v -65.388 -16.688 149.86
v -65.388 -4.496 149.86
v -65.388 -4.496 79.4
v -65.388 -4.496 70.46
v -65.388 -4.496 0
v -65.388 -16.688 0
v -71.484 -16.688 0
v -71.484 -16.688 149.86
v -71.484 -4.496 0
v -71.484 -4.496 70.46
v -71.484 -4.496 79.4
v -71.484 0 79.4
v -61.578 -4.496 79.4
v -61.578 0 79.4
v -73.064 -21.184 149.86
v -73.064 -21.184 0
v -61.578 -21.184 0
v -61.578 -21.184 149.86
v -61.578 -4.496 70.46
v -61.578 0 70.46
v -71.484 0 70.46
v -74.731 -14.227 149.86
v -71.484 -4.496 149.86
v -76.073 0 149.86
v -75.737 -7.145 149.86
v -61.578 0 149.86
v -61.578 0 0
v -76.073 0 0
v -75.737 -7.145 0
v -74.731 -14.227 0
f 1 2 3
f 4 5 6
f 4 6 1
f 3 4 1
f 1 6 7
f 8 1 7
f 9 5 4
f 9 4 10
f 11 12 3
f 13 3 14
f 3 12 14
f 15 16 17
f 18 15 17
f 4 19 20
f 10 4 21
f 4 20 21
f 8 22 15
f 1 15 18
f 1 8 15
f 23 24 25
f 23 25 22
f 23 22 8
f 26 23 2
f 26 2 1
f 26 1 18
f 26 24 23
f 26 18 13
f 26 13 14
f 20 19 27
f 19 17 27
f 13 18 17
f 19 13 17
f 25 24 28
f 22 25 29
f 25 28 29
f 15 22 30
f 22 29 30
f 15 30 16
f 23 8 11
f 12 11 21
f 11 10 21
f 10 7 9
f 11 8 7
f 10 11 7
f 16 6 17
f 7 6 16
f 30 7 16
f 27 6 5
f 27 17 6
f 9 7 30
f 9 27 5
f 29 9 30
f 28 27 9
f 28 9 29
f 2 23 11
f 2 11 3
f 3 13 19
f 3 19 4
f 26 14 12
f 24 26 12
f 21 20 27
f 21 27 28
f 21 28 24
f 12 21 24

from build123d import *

# Parameters (mm, degrees)
BOSS_EXTRUDE1_DEPTH = 149.86
SKETCH2_W           = 9.906
SKETCH2_H           = 4.4958
BOSS_EXTRUDE2_DEPTH = 70.4596
SKETCH3_W           = 9.906
SKETCH3_H           = 4.4958
BOSS_EXTRUDE3_DEPTH = 70.4596


with BuildPart() as part:
    # Sketch1 → Boss-Extrude1 (new body)
    with BuildSketch(Plane.XY):
        with BuildLine():
            Line((-61.5779714, -4.4958), (-65.3879714, -4.4958))
            Line((-65.3879714, -4.4958), (-65.3879714, -16.6878))
            Line((-65.3879714, -16.6878), (-71.4839714, -16.6878))
            Line((-71.4839714, -16.6878), (-71.4839714, 0))
            Line((-71.4839714, 0), (-76.073, 0))
            ThreePointArc((-76.073, 0), (-75.317007822, -10.698114871), (-73.064056964, -21.1836))
            Line((-73.064056964, -21.1836), (-61.5779714, -21.1836))
            Line((-61.5779714, -21.1836), (-61.5779714, -4.4958))
        make_face()
    extrude(amount=BOSS_EXTRUDE1_DEPTH)

    # Sketch2 → Boss-Extrude2 (add)
    with BuildSketch(Plane.XY.offset(149.86)):
        with Locations((-66.5309714, -2.2479)):
            Rectangle(SKETCH2_W, SKETCH2_H)
    extrude(amount=-BOSS_EXTRUDE2_DEPTH)

    # Sketch3 → Boss-Extrude3 (add)
    with BuildSketch(Plane(origin=(0, 0, 0), x_dir=(-1, 0, 0), z_dir=(0, 0, -1))):
        with Locations((66.5309714, -2.2479)):
            Rectangle(SKETCH3_W, SKETCH3_H)
    extrude(amount=-BOSS_EXTRUDE3_DEPTH)


solid = part.part
